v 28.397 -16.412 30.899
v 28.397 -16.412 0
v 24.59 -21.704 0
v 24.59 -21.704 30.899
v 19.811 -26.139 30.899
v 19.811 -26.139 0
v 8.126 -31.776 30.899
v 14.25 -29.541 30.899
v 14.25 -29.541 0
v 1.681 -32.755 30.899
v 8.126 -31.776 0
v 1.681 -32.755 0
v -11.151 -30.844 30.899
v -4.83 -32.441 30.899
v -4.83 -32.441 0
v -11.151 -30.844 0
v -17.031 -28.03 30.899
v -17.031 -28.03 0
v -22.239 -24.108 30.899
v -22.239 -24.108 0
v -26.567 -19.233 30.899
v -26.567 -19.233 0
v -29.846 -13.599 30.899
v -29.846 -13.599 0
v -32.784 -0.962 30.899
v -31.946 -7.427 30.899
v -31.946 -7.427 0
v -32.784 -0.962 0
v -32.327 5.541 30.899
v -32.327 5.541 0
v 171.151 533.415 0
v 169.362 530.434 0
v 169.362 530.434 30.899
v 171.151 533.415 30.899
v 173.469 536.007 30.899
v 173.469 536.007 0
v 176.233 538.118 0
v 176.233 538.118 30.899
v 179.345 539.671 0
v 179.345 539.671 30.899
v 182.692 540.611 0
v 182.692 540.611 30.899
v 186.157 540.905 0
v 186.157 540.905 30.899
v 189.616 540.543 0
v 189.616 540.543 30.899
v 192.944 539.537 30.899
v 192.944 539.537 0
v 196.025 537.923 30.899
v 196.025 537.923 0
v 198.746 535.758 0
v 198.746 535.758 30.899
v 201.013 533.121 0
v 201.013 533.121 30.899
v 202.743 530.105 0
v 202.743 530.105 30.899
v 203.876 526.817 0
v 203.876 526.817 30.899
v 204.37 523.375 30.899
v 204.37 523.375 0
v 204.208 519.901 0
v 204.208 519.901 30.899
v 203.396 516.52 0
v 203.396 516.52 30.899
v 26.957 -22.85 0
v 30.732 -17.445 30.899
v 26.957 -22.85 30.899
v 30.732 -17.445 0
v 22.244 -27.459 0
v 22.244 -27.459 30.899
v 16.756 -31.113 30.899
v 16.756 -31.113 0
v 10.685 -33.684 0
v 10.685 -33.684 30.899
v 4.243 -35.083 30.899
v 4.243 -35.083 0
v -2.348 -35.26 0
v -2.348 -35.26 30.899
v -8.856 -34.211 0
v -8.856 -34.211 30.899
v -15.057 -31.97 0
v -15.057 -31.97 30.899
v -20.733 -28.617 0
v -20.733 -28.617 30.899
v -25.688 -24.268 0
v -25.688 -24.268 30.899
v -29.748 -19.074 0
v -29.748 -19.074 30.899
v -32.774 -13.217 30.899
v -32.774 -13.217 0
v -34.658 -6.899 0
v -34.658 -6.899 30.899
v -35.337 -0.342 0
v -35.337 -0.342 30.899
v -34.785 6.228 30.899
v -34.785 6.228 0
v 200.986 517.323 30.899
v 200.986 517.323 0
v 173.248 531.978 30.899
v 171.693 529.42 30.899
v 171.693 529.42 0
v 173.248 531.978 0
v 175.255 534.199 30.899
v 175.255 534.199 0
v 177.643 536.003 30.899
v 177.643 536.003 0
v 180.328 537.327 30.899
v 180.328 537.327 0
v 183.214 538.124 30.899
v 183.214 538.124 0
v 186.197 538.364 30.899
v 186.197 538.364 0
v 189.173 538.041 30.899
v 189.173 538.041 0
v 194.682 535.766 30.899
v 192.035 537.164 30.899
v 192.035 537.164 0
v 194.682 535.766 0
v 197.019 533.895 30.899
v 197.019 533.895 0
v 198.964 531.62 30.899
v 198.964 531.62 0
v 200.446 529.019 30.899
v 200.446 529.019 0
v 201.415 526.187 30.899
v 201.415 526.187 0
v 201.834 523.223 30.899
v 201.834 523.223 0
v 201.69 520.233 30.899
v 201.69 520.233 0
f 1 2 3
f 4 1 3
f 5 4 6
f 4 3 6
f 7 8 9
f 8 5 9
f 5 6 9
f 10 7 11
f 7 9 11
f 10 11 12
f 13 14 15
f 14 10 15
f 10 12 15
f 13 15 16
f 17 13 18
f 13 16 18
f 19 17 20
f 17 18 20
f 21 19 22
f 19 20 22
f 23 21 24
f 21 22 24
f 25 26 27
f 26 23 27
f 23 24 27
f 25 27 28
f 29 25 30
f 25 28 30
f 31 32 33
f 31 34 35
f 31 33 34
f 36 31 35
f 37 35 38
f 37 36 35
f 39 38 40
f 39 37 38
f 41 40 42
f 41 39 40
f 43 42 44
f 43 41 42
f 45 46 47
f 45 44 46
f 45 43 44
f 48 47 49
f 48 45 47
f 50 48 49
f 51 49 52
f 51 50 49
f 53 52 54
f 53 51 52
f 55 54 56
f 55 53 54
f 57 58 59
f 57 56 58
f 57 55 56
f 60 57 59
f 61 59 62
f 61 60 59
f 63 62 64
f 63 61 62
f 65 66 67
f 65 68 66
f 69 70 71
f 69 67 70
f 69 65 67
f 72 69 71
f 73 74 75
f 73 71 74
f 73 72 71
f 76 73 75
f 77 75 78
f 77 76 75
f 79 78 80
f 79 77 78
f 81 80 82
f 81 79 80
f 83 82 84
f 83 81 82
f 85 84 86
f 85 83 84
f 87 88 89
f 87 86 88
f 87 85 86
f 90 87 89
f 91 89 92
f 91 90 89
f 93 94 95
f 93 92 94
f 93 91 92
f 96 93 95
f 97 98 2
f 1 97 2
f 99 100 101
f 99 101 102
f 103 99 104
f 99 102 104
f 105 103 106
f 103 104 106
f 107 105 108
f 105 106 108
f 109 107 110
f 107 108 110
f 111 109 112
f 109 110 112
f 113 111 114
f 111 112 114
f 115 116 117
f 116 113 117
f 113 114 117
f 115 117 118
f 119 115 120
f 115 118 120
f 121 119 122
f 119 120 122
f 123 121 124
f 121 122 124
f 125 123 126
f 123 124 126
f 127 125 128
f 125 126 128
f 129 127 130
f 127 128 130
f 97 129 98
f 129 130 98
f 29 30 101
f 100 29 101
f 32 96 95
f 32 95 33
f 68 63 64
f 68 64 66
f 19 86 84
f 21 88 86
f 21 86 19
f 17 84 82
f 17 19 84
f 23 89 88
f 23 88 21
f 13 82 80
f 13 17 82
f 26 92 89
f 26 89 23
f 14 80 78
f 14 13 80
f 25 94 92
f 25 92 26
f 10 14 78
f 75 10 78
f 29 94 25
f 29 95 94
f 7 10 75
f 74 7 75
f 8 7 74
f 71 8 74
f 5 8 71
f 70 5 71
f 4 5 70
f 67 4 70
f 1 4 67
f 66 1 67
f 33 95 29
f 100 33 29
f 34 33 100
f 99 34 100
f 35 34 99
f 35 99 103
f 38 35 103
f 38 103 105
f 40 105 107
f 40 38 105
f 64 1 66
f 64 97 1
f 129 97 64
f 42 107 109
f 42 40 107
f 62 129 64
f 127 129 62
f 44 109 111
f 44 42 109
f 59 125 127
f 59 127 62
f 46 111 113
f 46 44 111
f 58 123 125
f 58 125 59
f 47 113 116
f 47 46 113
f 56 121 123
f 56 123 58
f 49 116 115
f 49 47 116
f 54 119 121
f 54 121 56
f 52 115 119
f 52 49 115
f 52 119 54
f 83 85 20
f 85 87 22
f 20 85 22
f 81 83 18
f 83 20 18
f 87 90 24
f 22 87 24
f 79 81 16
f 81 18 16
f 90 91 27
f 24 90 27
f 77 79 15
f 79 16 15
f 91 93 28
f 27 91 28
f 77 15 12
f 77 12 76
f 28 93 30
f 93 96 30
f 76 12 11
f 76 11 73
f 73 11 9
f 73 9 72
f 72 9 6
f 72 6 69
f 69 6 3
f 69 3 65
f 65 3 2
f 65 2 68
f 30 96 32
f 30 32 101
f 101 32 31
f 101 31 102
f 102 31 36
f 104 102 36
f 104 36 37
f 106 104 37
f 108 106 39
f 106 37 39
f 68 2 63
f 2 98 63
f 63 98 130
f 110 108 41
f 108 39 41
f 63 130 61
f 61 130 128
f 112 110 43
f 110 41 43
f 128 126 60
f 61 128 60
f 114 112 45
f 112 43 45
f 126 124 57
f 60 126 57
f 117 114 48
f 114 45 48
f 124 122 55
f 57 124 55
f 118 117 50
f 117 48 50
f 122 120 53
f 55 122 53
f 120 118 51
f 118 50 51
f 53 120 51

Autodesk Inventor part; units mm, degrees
ref_plane "YZ Plane" through (0, 0, 0) normal (1, 0, 0) x (0, 1, 0)
ref_plane "XZ Plane" through (0, 0, 0) normal (0, 1, 0) x (-1, 0, 0)
ref_plane "XY Plane" through (0, 0, 0) normal (0, 0, 1) x (1, 0, 0)
ref_plane "Work Plane1" through (0, 0, 0) normal (0, 0, 1) x (1, 0, 0)
sketch "Sketch1" plane through (0, 0, 0) normal (0, 0, 1) x (1, 0, 0)
  arc A0 (7.5768, -31.9111) -> (11.0096, -30.8953) centre (0, 0) ccw construction
  arc A1 (2.7361, -32.684) -> (6.282, -32.1911) centre (0, 0) ccw construction
  arc A2 (-2.1658, -32.7267) -> (1.414, -32.7678) centre (0, 0) ccw construction
  arc A3 (12.2483, -30.4254) -> (15.4914, -28.9093) centre (0, 0) ccw construction
  arc A4 (16.6462, -28.2601) -> (19.627, -26.2775) centre (0, 0) ccw construction
  circle A5 centre (0, 0) radius 37.1131 construction
  circle A6 centre (0, 0) radius 32.4639 construction
  arc A7 (-32.3268, 5.5412) -> (28.3967, -16.412) centre (0, 0) ccw
  circle A8 centre (185.9759, 522.491) radius 15.875 construction
  circle A9 centre (185.9759, 522.491) radius 6.35 construction
  arc A10 (198.6184, 512.8898) -> (171.693, 529.4203) centre (185.9759, 522.491) ccw construction
  arc A11 (200.9863, 517.3234) -> (171.693, 529.4203) centre (185.9759, 522.491) ccw
  line L0 (200.9863, 517.3234) -> (28.3967, -16.412)
  line L1 (-32.3268, 5.5412) -> (171.693, 529.4203)
  arc A12 (203.396, 516.52) -> (169.3619, 530.4337) centre (185.9759, 522.491) ccw
  line L2 (203.396, 516.52) -> (30.7322, -17.445)
  arc A13 (-34.7852, 6.228) -> (30.7322, -17.445) centre (0, 0) ccw
  line L3 (-34.7852, 6.228) -> (169.3619, 530.4337)
  dimension "d0" = 2.54
extrude "Extrusion1" add sketch "Sketch1" along normal up to surface (30.8991 mm away)
properties part number "Belt" material "Acetal Resin, Black"
